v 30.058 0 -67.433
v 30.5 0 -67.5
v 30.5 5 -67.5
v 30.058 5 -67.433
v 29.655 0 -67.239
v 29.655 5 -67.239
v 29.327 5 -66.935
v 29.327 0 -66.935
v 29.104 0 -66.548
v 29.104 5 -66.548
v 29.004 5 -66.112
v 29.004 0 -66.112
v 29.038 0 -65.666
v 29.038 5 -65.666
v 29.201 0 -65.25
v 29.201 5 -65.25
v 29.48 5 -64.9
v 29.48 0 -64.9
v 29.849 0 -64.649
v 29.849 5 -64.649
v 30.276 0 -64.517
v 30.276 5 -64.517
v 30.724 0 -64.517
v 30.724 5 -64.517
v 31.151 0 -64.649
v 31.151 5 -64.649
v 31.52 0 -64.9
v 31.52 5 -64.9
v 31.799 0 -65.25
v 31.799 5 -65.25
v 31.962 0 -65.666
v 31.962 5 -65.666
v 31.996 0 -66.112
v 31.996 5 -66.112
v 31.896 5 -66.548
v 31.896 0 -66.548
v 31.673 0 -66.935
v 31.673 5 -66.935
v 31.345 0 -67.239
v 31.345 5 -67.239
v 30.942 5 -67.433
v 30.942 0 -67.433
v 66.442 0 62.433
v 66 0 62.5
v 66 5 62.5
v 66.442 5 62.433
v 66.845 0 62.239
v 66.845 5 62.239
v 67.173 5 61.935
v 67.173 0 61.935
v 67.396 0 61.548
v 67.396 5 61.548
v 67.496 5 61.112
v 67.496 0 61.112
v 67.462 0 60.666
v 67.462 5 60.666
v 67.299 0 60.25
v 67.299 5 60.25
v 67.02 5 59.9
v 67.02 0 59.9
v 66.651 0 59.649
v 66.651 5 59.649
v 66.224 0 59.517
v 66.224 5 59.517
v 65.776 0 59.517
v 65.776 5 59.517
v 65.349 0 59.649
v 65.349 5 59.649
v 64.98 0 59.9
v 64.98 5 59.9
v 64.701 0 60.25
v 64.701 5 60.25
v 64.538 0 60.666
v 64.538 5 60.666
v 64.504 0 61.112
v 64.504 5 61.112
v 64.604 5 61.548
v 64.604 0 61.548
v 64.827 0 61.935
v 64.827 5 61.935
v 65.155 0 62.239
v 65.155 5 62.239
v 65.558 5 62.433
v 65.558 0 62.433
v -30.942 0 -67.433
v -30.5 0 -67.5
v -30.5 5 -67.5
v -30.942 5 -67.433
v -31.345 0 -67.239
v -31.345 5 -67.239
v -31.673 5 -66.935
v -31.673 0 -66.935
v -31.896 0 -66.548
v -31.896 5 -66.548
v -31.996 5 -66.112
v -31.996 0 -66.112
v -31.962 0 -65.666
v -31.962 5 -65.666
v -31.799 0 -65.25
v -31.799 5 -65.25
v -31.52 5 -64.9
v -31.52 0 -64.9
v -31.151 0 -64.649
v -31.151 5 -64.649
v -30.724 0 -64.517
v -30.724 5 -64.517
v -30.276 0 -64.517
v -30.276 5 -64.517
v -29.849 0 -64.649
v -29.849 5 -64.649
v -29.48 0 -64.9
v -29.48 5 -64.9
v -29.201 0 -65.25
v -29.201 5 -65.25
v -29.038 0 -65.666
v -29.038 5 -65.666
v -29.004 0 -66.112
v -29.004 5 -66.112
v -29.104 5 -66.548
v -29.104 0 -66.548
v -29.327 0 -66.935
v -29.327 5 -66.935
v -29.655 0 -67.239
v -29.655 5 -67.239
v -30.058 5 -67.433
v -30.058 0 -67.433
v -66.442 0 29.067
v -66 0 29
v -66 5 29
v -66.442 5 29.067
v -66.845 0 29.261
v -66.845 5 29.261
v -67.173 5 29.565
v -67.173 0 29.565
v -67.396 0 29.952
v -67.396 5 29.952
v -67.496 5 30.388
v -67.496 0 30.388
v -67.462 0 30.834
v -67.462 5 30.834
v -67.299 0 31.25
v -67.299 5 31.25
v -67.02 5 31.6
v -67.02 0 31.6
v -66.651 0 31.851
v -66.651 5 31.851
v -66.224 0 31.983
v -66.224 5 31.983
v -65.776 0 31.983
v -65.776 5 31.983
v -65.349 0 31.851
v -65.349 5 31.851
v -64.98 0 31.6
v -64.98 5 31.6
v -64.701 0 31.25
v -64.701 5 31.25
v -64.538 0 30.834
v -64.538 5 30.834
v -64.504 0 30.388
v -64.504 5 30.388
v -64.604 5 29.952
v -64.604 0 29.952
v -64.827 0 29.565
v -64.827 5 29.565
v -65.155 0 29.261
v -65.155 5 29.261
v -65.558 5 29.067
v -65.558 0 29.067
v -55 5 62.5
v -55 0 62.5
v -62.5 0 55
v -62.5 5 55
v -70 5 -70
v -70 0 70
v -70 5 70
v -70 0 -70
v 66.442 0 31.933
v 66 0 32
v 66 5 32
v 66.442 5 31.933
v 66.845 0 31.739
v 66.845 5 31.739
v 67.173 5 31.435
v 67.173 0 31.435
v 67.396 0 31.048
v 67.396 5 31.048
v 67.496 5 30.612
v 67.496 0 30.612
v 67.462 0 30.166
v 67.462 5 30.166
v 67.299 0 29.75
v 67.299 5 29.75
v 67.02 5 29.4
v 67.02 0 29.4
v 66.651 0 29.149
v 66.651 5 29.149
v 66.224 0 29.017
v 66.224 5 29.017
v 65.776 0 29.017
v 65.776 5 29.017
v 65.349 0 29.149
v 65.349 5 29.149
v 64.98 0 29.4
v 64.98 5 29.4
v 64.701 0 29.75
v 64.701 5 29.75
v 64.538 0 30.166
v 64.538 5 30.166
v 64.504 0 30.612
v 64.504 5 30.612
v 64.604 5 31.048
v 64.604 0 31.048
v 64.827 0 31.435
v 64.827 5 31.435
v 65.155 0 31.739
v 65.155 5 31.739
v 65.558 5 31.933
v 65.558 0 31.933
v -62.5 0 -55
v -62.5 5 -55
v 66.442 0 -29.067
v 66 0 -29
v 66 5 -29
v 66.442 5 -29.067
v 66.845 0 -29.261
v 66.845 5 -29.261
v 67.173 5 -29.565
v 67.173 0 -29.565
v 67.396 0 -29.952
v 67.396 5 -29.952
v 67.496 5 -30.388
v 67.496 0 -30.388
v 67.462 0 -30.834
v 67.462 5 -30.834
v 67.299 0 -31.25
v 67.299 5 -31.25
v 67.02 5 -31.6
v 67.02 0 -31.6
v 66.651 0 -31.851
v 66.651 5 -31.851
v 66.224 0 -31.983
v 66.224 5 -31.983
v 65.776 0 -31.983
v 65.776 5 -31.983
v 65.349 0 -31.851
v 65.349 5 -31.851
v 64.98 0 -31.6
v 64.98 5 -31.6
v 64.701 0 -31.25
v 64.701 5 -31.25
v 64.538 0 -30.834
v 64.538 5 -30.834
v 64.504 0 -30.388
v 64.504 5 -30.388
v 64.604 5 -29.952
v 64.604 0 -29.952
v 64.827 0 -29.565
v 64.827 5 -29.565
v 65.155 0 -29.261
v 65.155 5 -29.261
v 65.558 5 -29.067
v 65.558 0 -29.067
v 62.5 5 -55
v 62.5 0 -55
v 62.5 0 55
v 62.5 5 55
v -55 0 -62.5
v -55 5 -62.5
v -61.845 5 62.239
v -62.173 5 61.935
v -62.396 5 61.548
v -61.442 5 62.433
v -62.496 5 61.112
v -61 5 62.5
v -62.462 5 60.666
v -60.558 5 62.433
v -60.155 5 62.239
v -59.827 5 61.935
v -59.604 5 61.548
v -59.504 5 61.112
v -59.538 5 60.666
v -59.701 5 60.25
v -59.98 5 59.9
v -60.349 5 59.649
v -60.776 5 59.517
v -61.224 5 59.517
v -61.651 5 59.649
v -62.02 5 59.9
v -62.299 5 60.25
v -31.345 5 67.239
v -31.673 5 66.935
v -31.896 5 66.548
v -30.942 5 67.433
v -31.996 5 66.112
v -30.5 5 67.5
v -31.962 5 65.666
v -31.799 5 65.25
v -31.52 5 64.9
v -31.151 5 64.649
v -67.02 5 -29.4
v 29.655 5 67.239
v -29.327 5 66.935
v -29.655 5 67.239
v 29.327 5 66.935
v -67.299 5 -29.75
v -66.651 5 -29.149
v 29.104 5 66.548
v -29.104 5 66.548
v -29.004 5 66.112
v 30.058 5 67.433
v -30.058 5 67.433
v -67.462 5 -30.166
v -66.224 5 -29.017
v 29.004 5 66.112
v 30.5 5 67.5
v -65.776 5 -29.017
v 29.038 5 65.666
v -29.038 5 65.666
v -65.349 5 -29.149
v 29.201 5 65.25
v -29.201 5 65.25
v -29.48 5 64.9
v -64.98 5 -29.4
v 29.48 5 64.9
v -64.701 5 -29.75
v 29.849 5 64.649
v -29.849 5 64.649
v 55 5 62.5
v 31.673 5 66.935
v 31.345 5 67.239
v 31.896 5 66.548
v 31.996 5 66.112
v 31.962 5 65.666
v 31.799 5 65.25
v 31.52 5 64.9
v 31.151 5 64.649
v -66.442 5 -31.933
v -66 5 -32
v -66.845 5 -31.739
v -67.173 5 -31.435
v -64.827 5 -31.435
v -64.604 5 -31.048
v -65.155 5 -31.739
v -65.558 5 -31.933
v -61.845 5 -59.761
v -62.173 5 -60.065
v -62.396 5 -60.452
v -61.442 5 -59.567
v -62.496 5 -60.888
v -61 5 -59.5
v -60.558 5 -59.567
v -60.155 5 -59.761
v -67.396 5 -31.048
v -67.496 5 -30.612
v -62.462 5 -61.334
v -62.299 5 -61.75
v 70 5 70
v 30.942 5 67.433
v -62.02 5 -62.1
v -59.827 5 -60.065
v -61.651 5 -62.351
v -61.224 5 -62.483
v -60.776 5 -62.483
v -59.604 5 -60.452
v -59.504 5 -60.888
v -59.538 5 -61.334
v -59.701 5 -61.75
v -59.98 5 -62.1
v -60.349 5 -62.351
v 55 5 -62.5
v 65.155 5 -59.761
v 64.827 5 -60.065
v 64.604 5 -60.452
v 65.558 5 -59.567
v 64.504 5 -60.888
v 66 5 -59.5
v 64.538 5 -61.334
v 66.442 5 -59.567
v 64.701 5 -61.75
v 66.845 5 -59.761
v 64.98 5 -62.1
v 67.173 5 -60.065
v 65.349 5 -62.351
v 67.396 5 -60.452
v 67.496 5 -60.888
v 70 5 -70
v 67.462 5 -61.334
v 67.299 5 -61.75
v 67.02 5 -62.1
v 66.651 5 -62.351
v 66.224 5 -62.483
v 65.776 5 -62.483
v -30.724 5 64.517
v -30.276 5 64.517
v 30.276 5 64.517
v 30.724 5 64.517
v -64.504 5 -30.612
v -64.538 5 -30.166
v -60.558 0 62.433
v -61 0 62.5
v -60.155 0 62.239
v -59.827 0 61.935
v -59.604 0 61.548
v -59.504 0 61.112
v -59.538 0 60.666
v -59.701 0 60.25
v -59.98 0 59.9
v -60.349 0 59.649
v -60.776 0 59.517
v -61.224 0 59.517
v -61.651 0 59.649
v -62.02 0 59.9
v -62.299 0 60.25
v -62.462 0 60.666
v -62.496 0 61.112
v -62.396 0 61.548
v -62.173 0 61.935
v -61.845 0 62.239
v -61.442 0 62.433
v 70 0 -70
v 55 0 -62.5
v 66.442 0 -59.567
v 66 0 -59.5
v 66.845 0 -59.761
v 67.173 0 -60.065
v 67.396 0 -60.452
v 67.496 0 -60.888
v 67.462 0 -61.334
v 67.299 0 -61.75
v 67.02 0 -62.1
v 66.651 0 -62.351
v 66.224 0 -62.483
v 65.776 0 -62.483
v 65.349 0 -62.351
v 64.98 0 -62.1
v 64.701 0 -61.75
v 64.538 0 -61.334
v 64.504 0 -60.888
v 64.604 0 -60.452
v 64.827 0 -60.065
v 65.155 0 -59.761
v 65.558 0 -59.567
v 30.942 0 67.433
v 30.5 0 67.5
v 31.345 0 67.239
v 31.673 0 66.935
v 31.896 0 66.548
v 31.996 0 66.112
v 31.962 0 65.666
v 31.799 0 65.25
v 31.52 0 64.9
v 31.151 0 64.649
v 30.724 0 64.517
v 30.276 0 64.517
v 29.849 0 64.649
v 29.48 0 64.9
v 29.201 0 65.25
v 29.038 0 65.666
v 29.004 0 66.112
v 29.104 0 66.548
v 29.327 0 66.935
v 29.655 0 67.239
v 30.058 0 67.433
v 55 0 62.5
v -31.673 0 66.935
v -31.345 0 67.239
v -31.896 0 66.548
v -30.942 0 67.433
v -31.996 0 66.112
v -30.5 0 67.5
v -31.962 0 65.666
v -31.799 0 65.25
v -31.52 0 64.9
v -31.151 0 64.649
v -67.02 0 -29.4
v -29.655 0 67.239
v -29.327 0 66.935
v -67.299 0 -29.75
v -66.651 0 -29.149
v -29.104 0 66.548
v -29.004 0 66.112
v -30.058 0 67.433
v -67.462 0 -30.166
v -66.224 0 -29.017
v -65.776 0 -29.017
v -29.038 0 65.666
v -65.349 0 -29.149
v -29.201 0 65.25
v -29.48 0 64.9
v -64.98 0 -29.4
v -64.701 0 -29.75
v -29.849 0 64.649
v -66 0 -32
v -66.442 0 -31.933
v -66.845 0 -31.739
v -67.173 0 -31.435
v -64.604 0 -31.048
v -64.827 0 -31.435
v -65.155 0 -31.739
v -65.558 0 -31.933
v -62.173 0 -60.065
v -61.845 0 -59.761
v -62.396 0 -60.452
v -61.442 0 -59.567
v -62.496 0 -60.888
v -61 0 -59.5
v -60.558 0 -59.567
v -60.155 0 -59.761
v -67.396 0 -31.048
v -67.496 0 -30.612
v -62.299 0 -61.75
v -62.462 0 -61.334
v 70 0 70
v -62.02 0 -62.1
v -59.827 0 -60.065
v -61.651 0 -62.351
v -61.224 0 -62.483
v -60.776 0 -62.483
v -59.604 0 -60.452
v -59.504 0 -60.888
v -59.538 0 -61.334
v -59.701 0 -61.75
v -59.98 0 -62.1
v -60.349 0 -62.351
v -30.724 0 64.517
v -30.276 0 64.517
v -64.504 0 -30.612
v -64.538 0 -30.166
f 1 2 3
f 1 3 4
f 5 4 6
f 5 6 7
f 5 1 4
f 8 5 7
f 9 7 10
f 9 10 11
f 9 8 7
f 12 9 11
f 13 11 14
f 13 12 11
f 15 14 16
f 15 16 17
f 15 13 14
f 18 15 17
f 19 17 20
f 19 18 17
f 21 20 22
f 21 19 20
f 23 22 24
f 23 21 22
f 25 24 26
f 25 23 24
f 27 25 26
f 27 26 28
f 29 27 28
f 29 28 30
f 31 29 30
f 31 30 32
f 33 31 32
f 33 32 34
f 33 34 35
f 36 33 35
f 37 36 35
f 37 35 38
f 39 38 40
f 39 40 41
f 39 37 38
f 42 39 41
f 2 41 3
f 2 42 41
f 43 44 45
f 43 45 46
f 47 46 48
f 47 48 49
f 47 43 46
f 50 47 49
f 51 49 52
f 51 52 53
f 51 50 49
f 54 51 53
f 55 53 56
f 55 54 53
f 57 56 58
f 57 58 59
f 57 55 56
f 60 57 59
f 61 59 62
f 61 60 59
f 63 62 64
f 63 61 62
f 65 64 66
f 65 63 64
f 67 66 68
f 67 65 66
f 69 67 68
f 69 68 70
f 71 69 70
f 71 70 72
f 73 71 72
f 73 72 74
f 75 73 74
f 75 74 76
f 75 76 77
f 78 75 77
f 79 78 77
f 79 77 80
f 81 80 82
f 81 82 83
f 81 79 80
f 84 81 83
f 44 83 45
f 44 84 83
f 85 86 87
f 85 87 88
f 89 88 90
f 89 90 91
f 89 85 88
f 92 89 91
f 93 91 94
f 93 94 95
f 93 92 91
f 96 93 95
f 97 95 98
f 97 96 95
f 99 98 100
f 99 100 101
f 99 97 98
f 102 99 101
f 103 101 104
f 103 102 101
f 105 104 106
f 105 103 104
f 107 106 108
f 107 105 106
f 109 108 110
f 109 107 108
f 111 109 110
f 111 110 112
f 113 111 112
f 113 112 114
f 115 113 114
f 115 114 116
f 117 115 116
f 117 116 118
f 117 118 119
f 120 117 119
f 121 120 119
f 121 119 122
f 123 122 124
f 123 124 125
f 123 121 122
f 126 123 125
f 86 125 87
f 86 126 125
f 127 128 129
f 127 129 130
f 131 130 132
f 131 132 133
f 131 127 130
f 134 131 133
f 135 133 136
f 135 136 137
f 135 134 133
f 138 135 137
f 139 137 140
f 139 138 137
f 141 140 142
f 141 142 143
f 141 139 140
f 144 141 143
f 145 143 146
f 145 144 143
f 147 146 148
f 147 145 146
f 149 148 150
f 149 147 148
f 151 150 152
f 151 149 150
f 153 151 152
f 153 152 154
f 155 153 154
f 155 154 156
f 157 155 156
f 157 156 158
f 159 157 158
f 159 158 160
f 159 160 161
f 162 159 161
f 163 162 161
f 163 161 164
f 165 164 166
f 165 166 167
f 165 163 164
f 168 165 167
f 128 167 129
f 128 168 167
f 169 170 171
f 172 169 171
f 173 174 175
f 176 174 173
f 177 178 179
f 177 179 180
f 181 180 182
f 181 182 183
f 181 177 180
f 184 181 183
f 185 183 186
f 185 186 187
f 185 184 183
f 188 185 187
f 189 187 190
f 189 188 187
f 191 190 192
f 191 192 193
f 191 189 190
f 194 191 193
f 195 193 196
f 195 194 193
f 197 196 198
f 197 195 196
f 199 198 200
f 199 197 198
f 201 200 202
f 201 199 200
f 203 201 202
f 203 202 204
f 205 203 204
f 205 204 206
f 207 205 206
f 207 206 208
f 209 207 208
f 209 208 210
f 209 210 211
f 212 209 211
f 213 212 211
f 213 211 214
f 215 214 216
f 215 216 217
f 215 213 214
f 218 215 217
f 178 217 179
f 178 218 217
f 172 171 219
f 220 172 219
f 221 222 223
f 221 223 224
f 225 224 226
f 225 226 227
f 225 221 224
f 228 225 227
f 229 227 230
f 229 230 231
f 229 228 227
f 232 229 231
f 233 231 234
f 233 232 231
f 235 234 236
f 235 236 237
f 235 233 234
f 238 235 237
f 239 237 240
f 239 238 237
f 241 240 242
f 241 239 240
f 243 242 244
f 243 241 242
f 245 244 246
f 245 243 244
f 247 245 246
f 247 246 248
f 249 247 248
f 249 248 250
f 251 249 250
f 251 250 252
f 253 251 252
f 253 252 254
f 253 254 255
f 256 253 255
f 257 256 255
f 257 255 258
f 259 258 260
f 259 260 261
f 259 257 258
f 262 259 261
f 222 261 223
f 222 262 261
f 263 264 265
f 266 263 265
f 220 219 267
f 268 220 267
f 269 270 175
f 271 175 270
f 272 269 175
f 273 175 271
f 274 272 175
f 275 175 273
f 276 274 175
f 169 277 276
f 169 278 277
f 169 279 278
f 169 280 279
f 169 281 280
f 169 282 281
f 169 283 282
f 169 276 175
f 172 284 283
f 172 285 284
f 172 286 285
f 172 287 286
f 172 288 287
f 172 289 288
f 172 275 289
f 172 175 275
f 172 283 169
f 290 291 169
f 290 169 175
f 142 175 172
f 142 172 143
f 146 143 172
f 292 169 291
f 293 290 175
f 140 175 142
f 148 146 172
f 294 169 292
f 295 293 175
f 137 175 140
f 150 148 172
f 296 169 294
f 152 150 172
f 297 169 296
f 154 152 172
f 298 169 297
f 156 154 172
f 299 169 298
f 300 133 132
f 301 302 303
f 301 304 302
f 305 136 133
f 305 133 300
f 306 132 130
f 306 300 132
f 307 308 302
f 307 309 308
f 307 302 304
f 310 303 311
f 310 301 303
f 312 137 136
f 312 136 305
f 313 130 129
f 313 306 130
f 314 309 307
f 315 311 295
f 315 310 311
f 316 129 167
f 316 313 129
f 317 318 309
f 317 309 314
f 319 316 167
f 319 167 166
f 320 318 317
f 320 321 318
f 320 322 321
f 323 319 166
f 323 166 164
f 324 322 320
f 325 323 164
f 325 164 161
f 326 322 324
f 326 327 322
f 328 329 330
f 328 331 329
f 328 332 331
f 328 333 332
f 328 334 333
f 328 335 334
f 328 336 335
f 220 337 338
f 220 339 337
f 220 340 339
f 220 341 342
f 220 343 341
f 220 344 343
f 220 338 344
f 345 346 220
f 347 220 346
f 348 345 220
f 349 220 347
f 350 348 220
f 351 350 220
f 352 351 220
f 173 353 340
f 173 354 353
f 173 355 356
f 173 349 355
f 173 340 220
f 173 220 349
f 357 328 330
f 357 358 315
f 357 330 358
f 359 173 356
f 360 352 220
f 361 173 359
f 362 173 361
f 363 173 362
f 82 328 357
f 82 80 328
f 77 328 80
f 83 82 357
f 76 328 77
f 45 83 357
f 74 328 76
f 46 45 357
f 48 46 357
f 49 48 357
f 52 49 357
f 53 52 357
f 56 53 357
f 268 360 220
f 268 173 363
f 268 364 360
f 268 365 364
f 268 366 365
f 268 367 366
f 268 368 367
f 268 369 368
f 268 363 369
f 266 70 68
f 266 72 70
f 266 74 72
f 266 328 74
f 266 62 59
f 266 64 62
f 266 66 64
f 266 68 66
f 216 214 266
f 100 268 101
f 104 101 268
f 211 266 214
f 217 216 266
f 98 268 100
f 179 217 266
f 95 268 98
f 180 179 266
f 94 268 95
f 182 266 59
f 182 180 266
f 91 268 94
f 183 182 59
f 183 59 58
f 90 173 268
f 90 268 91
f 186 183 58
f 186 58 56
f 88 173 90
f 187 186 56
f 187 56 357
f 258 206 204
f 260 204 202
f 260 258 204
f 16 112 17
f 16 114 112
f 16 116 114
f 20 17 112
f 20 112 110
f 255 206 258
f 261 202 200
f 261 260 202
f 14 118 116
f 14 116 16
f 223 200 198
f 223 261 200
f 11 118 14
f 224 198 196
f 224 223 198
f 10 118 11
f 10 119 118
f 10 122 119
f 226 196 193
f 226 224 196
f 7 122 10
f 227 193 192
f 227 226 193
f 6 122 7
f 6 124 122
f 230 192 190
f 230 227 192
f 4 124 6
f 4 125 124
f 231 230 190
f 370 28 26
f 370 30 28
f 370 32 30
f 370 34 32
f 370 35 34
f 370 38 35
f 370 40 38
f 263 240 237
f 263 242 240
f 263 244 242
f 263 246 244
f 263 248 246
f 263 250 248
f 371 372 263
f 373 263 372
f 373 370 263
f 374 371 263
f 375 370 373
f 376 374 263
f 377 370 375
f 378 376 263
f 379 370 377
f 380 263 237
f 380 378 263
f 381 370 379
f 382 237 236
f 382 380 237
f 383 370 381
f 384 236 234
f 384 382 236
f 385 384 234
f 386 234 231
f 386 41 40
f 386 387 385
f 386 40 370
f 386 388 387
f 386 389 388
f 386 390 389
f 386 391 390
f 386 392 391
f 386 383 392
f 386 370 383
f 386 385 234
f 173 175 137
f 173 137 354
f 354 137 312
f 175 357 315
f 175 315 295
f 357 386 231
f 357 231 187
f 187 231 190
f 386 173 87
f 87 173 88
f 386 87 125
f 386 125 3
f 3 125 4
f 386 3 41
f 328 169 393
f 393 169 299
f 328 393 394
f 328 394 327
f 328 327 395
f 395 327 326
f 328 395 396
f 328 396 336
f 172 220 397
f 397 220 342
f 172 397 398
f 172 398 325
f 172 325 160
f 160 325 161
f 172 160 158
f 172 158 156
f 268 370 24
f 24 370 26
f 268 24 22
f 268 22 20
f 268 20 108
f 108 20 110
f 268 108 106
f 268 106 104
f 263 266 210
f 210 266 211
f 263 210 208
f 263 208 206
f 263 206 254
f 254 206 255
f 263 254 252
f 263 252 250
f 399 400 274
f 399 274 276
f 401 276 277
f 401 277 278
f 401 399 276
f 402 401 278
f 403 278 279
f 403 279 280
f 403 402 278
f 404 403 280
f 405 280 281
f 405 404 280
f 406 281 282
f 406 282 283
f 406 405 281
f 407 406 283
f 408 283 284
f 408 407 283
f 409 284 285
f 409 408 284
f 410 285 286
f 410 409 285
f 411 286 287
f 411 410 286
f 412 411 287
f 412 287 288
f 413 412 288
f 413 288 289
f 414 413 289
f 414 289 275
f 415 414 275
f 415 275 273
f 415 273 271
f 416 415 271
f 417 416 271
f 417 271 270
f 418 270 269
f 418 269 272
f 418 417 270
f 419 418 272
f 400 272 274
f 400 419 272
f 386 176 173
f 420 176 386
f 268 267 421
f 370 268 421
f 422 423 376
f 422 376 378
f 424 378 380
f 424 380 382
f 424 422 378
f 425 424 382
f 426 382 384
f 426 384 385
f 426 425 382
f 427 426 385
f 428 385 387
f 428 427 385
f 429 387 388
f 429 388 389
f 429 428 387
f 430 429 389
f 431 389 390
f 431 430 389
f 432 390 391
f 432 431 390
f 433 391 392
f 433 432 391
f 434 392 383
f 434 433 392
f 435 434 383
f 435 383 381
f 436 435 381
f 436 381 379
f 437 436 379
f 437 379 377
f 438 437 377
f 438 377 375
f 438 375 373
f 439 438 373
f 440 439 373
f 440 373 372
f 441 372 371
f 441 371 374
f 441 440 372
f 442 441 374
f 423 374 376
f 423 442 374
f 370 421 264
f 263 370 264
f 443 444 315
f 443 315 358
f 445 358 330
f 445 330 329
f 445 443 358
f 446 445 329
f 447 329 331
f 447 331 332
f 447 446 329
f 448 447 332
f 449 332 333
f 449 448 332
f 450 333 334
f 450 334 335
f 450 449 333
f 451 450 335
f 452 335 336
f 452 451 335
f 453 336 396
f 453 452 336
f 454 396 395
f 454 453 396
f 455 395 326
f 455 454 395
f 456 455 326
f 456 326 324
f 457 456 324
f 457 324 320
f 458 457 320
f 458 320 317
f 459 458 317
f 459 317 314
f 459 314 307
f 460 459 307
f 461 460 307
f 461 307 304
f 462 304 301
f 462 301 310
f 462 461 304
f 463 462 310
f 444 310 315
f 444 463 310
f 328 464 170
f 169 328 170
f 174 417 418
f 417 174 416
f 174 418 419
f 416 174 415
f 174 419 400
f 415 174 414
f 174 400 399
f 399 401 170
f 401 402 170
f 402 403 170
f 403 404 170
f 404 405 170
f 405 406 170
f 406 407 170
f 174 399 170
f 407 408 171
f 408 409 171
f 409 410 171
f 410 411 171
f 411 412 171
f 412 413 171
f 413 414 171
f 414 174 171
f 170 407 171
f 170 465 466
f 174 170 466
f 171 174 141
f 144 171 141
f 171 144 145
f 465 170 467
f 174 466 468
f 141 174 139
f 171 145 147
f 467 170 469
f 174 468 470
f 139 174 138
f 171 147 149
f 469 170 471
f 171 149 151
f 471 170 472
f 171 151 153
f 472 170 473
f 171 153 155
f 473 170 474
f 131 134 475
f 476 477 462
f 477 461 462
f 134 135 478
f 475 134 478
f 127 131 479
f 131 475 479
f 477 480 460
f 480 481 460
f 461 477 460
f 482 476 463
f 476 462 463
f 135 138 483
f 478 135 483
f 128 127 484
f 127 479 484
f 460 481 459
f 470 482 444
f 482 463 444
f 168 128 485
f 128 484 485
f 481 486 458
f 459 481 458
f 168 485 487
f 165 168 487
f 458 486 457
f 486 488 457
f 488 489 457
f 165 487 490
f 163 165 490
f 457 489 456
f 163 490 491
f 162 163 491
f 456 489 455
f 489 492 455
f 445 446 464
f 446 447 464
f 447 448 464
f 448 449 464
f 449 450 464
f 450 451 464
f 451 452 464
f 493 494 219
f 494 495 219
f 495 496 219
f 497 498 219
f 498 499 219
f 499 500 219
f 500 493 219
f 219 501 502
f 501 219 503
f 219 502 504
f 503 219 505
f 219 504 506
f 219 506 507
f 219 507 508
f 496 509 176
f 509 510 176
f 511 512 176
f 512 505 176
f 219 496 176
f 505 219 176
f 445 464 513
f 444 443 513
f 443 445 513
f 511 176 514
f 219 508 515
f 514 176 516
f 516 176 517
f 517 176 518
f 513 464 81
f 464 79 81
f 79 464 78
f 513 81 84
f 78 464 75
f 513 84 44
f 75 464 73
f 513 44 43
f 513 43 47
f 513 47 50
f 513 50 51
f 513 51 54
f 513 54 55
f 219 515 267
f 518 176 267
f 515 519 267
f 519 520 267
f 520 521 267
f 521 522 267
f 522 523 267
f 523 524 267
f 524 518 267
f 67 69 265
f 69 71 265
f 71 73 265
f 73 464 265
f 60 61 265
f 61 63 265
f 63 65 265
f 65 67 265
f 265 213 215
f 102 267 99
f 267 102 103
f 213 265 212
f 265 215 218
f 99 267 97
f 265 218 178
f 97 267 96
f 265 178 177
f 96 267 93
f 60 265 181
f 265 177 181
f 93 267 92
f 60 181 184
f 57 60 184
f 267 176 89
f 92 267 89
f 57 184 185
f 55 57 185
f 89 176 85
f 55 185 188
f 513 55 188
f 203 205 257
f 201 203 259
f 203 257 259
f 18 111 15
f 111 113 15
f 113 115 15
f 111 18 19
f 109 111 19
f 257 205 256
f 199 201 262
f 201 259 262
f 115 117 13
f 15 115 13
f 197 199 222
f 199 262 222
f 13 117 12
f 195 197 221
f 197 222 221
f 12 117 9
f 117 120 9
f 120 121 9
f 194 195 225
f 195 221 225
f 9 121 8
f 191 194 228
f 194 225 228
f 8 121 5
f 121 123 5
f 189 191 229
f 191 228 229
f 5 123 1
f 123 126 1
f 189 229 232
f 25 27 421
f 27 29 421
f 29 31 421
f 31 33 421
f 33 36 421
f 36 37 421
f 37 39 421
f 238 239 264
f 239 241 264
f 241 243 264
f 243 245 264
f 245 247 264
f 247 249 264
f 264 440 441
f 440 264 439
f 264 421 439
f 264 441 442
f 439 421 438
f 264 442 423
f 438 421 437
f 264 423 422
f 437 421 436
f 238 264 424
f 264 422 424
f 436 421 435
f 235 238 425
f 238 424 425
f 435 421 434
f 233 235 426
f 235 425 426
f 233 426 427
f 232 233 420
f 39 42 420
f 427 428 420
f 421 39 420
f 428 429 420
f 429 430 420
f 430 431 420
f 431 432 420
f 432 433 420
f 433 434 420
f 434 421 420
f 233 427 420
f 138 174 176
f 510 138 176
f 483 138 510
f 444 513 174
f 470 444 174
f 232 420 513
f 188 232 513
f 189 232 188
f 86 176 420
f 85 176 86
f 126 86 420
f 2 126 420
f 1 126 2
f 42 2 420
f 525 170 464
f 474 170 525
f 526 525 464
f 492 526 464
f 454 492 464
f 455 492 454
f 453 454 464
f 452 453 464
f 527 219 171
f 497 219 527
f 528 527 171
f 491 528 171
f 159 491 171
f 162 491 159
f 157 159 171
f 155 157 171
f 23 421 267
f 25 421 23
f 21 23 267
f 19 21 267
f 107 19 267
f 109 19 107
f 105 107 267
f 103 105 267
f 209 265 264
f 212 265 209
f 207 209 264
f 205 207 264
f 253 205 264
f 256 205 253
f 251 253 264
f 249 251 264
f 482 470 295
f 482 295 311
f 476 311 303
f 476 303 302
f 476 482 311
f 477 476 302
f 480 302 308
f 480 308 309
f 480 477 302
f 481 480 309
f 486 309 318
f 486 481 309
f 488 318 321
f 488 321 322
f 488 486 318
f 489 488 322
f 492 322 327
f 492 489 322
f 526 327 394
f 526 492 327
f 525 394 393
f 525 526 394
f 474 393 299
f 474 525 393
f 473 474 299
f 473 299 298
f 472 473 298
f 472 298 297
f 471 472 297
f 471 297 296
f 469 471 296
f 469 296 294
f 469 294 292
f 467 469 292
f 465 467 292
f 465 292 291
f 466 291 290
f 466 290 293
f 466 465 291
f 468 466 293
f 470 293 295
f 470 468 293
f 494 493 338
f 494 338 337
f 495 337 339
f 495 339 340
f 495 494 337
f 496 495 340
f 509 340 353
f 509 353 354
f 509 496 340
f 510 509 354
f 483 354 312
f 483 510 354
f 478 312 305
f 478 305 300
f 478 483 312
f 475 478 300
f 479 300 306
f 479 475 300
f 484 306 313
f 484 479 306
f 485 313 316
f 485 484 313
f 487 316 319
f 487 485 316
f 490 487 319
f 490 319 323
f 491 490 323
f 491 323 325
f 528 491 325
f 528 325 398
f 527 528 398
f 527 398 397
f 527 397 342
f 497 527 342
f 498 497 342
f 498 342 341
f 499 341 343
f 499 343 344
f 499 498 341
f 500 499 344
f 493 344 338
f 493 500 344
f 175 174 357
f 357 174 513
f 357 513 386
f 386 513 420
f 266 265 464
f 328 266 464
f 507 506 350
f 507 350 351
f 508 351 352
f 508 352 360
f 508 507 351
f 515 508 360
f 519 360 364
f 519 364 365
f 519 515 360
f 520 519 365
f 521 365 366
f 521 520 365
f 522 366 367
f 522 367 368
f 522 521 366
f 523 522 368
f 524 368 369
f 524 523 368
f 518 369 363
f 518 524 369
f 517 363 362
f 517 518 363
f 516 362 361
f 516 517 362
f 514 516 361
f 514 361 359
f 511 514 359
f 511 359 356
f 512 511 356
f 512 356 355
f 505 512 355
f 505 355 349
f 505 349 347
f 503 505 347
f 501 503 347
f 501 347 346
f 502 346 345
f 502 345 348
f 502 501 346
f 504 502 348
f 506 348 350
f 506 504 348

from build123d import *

# Parameters (mm, degrees)
CROQUIS1_W              = 140
CROQUIS1_H              = 140
CROQUIS1_R              = 1.5
SALIENTE_EXTRUIR1_DEPTH = 5


with BuildPart() as part:
    # Croquis1 → Saliente-Extruir1 (new body)
    with BuildSketch(Plane(origin=(0, 0, 0), x_dir=(1, 0, 0), z_dir=(0, 1, 0))):
        Rectangle(CROQUIS1_W, CROQUIS1_H)
        with Locations(Location((-61, 61, 0), (0, 0, 270))):
            Circle(CROQUIS1_R, mode=Mode.SUBTRACT)
        with Locations(Location((66, 61, 0), (0, 0, 270))):
            Circle(CROQUIS1_R, mode=Mode.SUBTRACT)
        with Locations(Location((66, -61, 0), (0, 0, 270))):
            Circle(CROQUIS1_R, mode=Mode.SUBTRACT)
        with Locations(Location((-61, -61, 0), (0, 0, 270))):
            Circle(CROQUIS1_R, mode=Mode.SUBTRACT)
        with Locations(Location((66, 30.5, 0), (0, 0, 270))):
            Circle(CROQUIS1_R, mode=Mode.SUBTRACT)
        with Locations(Location((66, -30.5, 0), (0, 0, 270))):
            Circle(CROQUIS1_R, mode=Mode.SUBTRACT)
        with Locations(Location((-30.5, -66, 0), (0, 0, 270))):
            Circle(CROQUIS1_R, mode=Mode.SUBTRACT)
        with Locations(Location((30.5, -66, 0), (0, 0, 270))):
            Circle(CROQUIS1_R, mode=Mode.SUBTRACT)
        with Locations(Location((-30.5, 66, 0), (0, 0, 90))):
            Circle(CROQUIS1_R, mode=Mode.SUBTRACT)
        with Locations(Location((30.5, 66, 0), (0, 0, 90))):
            Circle(CROQUIS1_R, mode=Mode.SUBTRACT)
        with Locations(Location((-66, 30.5, 0), (0, 0, 90))):
            Circle(CROQUIS1_R, mode=Mode.SUBTRACT)
        with Locations(Location((-66, -30.5, 0), (0, 0, 90))):
            Circle(CROQUIS1_R, mode=Mode.SUBTRACT)
        Polygon((-55, -62.5), (-62.5, -55), (-62.5, 55), (-55, 62.5), (55, 62.5), (62.5, 55), (62.5, -55), (55, -62.5), align=None, mode=Mode.SUBTRACT)
    extrude(amount=SALIENTE_EXTRUIR1_DEPTH)


solid = part.part
